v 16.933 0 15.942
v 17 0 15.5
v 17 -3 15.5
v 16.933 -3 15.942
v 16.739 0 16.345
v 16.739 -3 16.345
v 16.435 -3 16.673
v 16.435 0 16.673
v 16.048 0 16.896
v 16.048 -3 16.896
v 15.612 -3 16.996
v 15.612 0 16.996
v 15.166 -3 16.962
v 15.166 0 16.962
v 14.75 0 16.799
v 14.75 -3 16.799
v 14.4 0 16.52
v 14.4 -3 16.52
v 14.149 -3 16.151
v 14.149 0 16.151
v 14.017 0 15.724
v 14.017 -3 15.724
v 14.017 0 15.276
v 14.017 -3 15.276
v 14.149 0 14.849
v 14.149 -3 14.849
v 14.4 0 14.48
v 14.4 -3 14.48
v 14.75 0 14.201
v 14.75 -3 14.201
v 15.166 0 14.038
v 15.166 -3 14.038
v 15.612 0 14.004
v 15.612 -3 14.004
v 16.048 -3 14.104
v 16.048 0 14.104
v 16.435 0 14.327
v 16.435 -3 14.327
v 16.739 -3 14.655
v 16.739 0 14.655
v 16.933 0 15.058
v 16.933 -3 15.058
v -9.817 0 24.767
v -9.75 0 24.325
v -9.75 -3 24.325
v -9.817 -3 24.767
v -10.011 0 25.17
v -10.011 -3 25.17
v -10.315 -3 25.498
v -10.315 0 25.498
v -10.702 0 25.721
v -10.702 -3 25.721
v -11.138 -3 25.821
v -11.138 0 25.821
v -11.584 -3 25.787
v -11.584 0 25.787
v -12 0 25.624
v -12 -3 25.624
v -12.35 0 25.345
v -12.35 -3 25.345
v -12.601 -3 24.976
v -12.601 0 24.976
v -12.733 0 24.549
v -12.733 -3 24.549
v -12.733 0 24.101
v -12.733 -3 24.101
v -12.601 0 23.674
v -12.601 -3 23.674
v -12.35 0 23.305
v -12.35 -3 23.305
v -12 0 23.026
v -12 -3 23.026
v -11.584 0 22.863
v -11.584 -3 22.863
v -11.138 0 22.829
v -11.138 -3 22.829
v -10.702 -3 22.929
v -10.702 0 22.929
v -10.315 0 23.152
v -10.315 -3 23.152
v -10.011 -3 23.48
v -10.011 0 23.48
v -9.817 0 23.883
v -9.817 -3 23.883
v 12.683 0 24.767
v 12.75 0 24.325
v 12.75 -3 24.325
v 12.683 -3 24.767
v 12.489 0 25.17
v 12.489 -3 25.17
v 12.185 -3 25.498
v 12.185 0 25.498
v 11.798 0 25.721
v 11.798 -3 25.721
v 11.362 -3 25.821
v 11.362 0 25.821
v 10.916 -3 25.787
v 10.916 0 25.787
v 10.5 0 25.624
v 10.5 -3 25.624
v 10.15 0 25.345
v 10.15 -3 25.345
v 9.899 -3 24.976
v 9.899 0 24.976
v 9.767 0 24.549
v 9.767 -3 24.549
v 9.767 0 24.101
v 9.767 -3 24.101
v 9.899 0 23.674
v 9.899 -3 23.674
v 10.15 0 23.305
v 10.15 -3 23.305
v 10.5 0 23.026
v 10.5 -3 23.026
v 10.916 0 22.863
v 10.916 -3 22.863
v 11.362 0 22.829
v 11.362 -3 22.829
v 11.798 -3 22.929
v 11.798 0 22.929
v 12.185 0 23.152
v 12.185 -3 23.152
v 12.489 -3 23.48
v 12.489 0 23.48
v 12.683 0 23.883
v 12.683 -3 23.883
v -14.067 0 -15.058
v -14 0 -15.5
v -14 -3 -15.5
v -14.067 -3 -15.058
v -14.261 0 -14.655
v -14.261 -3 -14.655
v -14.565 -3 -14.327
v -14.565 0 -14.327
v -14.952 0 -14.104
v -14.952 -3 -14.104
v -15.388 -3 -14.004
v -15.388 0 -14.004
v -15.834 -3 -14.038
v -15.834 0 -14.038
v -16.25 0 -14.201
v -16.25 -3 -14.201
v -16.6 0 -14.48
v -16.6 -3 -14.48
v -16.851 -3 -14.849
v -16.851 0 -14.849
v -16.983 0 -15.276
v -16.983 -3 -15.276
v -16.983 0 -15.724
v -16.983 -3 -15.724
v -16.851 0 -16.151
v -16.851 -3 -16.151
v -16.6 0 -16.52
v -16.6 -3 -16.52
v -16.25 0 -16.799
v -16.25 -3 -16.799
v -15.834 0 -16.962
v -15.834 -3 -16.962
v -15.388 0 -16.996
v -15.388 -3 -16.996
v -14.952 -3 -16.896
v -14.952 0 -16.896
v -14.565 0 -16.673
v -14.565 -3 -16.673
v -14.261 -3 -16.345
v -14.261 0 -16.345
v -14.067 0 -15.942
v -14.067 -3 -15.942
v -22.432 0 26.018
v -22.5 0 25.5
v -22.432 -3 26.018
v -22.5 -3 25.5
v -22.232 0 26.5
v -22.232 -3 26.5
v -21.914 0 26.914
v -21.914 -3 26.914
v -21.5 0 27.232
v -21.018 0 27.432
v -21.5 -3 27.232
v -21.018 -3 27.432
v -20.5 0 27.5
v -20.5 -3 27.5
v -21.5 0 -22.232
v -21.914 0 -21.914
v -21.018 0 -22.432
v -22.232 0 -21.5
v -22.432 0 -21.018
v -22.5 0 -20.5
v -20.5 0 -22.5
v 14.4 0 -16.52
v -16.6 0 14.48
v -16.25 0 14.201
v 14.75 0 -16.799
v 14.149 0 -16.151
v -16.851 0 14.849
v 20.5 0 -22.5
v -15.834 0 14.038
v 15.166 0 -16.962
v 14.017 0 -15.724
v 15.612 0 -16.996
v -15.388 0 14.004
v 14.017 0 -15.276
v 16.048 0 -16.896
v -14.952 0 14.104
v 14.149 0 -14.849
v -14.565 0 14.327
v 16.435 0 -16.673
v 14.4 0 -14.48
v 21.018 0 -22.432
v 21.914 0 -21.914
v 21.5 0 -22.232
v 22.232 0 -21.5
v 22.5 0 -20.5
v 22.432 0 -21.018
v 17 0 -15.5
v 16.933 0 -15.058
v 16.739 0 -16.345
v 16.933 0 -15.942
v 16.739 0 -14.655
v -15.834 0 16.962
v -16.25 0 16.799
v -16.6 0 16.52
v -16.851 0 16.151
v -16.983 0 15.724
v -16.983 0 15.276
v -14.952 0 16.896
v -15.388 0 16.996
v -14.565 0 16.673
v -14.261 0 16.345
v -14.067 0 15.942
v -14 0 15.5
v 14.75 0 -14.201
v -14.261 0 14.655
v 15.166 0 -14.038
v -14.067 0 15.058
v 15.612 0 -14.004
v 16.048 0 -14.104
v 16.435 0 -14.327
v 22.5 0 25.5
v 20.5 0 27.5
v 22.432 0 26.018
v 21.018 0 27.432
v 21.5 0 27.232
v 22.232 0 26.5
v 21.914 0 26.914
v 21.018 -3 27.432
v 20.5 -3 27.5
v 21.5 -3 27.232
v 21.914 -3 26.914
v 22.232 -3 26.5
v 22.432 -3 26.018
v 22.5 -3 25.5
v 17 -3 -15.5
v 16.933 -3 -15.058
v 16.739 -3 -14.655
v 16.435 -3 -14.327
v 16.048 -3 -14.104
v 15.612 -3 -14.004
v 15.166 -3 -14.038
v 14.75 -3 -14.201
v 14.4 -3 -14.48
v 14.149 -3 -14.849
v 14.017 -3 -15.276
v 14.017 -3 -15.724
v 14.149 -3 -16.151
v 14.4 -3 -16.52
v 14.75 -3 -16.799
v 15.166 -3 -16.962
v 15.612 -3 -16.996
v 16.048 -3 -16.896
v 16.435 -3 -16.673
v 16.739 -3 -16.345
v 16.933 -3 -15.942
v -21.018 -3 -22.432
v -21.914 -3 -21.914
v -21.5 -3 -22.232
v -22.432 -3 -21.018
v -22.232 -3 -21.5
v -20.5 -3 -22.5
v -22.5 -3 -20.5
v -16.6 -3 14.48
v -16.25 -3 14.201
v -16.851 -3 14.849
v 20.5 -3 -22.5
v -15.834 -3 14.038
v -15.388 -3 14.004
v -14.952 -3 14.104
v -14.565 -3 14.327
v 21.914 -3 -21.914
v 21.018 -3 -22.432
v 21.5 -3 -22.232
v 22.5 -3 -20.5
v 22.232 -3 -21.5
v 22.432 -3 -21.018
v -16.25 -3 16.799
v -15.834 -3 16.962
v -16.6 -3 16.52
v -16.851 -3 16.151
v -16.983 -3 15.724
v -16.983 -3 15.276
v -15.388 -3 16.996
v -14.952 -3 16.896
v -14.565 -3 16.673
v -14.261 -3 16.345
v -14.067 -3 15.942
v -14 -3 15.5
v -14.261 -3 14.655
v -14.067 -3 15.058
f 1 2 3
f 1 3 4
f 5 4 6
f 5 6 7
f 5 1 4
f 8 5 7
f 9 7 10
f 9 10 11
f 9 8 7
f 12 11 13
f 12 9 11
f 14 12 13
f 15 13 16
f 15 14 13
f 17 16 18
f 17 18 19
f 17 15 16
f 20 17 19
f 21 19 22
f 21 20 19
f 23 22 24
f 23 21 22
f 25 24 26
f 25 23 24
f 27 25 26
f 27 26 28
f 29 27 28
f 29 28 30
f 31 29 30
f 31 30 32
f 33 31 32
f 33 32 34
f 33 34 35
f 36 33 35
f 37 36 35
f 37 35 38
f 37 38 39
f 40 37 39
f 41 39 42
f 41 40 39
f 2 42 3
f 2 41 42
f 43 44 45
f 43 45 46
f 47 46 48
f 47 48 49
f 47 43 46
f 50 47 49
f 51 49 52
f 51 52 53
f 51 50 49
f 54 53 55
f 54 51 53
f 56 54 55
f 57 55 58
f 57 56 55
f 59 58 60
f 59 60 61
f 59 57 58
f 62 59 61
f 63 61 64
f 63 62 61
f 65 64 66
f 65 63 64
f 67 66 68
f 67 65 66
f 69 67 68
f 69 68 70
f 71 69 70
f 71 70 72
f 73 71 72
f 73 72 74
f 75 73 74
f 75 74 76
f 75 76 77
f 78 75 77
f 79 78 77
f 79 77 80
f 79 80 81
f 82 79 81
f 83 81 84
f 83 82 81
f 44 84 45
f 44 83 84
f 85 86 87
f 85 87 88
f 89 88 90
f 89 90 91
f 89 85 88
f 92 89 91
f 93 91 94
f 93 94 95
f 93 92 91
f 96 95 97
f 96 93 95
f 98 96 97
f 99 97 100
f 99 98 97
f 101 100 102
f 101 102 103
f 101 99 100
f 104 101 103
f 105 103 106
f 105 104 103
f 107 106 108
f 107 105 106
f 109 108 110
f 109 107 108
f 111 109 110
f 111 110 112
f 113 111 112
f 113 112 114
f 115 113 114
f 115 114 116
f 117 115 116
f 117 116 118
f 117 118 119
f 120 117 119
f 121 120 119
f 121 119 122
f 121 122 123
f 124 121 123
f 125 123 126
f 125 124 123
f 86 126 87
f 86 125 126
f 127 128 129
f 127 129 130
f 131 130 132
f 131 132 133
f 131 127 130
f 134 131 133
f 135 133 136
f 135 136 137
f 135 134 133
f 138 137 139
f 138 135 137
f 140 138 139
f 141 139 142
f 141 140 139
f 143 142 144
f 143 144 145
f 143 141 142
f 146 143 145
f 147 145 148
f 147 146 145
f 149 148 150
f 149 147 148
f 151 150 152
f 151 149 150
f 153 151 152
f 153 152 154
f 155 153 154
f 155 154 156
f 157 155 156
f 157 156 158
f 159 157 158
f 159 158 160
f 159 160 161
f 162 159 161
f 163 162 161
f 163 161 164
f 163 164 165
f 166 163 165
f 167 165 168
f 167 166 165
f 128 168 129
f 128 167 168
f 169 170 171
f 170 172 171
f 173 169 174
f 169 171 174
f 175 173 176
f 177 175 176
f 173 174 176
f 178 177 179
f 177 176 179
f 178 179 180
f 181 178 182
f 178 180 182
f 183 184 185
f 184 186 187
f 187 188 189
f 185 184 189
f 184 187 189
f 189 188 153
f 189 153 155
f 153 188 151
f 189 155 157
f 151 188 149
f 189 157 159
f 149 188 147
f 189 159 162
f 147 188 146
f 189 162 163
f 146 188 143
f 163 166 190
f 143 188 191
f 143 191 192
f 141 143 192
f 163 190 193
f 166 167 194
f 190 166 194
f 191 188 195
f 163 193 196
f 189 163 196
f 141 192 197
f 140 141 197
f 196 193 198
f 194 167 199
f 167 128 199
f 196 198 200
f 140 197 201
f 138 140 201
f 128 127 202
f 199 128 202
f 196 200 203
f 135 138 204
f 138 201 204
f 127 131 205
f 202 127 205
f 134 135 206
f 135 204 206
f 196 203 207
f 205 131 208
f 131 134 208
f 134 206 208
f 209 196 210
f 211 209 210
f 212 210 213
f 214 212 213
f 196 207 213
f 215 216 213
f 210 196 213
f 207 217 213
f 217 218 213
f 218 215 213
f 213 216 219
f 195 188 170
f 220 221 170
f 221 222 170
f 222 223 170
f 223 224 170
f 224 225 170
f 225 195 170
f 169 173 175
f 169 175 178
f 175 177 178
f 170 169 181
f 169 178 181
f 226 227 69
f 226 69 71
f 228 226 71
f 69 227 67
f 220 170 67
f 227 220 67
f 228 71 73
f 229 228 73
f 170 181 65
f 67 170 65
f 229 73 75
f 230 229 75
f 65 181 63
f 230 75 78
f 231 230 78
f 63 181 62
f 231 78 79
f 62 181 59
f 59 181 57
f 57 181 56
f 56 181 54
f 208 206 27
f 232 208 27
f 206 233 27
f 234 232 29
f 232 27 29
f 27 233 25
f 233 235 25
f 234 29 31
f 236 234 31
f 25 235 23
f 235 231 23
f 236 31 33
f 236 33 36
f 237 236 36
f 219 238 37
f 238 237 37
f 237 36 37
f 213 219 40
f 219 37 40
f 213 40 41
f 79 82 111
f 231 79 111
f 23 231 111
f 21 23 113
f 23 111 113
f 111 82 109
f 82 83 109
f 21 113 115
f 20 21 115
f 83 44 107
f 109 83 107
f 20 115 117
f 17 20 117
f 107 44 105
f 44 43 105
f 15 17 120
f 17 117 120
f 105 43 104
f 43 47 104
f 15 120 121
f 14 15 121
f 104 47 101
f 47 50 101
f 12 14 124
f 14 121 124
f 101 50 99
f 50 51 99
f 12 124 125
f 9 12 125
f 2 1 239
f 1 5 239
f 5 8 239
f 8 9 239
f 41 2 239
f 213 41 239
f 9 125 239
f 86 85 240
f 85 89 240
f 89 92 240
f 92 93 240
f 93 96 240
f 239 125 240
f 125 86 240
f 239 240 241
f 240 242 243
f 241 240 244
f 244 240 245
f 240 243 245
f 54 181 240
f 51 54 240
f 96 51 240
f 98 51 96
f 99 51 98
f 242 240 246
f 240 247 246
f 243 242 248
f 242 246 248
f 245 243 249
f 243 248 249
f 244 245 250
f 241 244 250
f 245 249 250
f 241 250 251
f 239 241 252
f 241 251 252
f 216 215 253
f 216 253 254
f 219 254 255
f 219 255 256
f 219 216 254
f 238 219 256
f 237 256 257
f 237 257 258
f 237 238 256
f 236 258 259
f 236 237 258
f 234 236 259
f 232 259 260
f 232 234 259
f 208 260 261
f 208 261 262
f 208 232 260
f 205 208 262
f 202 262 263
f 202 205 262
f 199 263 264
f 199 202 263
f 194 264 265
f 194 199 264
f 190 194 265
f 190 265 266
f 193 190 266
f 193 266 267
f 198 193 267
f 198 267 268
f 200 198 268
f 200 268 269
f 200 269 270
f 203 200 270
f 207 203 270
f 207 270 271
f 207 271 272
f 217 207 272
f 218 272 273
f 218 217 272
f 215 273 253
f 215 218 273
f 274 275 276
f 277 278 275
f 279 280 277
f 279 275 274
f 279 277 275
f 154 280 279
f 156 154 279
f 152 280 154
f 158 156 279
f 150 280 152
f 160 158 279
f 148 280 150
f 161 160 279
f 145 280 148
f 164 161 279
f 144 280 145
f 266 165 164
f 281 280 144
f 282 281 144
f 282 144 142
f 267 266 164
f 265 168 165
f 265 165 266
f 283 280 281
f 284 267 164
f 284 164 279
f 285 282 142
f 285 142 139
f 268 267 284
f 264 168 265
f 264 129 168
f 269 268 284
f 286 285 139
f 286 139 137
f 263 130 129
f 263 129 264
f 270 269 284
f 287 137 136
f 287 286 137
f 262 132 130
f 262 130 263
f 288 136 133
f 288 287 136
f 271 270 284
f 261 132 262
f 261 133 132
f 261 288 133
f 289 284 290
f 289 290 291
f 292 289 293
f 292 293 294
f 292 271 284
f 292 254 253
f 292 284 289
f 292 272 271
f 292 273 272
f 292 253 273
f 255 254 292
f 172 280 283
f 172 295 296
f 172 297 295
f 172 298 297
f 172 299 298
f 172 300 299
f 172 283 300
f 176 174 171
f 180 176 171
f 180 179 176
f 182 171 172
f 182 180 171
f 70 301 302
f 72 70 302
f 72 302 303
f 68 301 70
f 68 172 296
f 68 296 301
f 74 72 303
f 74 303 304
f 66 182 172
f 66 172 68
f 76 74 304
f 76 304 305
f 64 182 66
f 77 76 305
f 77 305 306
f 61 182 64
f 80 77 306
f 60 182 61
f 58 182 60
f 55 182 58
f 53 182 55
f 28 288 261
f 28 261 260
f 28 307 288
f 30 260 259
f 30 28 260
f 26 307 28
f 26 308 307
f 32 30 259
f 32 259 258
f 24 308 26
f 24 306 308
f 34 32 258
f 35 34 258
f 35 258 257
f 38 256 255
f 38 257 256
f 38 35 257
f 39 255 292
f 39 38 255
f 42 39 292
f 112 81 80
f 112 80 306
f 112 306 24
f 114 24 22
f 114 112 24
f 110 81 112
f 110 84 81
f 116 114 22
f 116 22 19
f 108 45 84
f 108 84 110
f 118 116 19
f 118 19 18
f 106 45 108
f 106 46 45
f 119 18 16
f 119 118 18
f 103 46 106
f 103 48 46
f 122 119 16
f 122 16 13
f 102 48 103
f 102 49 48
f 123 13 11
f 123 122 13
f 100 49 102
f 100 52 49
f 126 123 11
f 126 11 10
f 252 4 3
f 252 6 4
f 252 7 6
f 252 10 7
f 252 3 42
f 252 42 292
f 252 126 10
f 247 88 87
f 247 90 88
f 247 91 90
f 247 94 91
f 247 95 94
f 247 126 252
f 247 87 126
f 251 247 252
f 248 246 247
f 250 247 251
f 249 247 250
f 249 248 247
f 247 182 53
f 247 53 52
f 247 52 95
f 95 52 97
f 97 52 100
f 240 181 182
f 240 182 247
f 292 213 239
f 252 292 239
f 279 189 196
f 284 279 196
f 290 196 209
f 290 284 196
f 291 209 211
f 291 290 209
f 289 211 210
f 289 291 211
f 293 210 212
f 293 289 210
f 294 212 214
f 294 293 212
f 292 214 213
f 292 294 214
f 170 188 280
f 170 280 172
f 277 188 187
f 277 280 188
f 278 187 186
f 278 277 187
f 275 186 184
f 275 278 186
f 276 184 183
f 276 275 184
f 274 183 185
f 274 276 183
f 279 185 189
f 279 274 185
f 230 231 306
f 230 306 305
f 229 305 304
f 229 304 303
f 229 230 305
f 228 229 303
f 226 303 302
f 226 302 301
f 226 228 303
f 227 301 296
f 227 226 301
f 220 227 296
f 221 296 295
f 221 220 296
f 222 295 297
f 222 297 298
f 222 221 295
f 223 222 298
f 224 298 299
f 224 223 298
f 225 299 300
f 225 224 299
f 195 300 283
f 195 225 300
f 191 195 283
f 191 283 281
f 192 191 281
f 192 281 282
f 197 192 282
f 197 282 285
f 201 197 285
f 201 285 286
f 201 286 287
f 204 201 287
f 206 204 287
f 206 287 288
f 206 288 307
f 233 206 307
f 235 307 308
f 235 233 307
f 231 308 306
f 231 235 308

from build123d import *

# Parameters (mm, degrees)
SKETCH_W  = 45
SKETCH_H  = 50
SKETCH_R  = 1.5
PAD_DEPTH = 3
FILLET_R  = 2


with BuildPart() as part:
    # Sketch (on XZ_Plane of Origin) → Pad (new body)
    with BuildSketch(Plane.XZ):
        with Locations((0, 2.5)):
            Rectangle(SKETCH_W, SKETCH_H)
        with Locations((-15.5, 15.5)):
            Circle(SKETCH_R, mode=Mode.SUBTRACT)
        with Locations((15.5, 15.5)):
            Circle(SKETCH_R, mode=Mode.SUBTRACT)
        with Locations((15.5, -15.5)):
            Circle(SKETCH_R, mode=Mode.SUBTRACT)
        with Locations((-15.5, -15.5)):
            Circle(SKETCH_R, mode=Mode.SUBTRACT)
        with Locations((-11.25, 24.325)):
            Circle(SKETCH_R, mode=Mode.SUBTRACT)
        with Locations((11.25, 24.325)):
            Circle(SKETCH_R, mode=Mode.SUBTRACT)
    extrude(amount=PAD_DEPTH)

    # Fillet
    fillet_edges = [part.edges().sort_by_distance(p)[0] for p in [
        (22.5, -1.5, 27.5),
        (22.5, -1.5, -22.5),
        (-22.5, -1.5, -22.5),
        (-22.5, -1.5, 27.5),
    ]]
    fillet(fillet_edges, radius=FILLET_R)


solid = part.part
